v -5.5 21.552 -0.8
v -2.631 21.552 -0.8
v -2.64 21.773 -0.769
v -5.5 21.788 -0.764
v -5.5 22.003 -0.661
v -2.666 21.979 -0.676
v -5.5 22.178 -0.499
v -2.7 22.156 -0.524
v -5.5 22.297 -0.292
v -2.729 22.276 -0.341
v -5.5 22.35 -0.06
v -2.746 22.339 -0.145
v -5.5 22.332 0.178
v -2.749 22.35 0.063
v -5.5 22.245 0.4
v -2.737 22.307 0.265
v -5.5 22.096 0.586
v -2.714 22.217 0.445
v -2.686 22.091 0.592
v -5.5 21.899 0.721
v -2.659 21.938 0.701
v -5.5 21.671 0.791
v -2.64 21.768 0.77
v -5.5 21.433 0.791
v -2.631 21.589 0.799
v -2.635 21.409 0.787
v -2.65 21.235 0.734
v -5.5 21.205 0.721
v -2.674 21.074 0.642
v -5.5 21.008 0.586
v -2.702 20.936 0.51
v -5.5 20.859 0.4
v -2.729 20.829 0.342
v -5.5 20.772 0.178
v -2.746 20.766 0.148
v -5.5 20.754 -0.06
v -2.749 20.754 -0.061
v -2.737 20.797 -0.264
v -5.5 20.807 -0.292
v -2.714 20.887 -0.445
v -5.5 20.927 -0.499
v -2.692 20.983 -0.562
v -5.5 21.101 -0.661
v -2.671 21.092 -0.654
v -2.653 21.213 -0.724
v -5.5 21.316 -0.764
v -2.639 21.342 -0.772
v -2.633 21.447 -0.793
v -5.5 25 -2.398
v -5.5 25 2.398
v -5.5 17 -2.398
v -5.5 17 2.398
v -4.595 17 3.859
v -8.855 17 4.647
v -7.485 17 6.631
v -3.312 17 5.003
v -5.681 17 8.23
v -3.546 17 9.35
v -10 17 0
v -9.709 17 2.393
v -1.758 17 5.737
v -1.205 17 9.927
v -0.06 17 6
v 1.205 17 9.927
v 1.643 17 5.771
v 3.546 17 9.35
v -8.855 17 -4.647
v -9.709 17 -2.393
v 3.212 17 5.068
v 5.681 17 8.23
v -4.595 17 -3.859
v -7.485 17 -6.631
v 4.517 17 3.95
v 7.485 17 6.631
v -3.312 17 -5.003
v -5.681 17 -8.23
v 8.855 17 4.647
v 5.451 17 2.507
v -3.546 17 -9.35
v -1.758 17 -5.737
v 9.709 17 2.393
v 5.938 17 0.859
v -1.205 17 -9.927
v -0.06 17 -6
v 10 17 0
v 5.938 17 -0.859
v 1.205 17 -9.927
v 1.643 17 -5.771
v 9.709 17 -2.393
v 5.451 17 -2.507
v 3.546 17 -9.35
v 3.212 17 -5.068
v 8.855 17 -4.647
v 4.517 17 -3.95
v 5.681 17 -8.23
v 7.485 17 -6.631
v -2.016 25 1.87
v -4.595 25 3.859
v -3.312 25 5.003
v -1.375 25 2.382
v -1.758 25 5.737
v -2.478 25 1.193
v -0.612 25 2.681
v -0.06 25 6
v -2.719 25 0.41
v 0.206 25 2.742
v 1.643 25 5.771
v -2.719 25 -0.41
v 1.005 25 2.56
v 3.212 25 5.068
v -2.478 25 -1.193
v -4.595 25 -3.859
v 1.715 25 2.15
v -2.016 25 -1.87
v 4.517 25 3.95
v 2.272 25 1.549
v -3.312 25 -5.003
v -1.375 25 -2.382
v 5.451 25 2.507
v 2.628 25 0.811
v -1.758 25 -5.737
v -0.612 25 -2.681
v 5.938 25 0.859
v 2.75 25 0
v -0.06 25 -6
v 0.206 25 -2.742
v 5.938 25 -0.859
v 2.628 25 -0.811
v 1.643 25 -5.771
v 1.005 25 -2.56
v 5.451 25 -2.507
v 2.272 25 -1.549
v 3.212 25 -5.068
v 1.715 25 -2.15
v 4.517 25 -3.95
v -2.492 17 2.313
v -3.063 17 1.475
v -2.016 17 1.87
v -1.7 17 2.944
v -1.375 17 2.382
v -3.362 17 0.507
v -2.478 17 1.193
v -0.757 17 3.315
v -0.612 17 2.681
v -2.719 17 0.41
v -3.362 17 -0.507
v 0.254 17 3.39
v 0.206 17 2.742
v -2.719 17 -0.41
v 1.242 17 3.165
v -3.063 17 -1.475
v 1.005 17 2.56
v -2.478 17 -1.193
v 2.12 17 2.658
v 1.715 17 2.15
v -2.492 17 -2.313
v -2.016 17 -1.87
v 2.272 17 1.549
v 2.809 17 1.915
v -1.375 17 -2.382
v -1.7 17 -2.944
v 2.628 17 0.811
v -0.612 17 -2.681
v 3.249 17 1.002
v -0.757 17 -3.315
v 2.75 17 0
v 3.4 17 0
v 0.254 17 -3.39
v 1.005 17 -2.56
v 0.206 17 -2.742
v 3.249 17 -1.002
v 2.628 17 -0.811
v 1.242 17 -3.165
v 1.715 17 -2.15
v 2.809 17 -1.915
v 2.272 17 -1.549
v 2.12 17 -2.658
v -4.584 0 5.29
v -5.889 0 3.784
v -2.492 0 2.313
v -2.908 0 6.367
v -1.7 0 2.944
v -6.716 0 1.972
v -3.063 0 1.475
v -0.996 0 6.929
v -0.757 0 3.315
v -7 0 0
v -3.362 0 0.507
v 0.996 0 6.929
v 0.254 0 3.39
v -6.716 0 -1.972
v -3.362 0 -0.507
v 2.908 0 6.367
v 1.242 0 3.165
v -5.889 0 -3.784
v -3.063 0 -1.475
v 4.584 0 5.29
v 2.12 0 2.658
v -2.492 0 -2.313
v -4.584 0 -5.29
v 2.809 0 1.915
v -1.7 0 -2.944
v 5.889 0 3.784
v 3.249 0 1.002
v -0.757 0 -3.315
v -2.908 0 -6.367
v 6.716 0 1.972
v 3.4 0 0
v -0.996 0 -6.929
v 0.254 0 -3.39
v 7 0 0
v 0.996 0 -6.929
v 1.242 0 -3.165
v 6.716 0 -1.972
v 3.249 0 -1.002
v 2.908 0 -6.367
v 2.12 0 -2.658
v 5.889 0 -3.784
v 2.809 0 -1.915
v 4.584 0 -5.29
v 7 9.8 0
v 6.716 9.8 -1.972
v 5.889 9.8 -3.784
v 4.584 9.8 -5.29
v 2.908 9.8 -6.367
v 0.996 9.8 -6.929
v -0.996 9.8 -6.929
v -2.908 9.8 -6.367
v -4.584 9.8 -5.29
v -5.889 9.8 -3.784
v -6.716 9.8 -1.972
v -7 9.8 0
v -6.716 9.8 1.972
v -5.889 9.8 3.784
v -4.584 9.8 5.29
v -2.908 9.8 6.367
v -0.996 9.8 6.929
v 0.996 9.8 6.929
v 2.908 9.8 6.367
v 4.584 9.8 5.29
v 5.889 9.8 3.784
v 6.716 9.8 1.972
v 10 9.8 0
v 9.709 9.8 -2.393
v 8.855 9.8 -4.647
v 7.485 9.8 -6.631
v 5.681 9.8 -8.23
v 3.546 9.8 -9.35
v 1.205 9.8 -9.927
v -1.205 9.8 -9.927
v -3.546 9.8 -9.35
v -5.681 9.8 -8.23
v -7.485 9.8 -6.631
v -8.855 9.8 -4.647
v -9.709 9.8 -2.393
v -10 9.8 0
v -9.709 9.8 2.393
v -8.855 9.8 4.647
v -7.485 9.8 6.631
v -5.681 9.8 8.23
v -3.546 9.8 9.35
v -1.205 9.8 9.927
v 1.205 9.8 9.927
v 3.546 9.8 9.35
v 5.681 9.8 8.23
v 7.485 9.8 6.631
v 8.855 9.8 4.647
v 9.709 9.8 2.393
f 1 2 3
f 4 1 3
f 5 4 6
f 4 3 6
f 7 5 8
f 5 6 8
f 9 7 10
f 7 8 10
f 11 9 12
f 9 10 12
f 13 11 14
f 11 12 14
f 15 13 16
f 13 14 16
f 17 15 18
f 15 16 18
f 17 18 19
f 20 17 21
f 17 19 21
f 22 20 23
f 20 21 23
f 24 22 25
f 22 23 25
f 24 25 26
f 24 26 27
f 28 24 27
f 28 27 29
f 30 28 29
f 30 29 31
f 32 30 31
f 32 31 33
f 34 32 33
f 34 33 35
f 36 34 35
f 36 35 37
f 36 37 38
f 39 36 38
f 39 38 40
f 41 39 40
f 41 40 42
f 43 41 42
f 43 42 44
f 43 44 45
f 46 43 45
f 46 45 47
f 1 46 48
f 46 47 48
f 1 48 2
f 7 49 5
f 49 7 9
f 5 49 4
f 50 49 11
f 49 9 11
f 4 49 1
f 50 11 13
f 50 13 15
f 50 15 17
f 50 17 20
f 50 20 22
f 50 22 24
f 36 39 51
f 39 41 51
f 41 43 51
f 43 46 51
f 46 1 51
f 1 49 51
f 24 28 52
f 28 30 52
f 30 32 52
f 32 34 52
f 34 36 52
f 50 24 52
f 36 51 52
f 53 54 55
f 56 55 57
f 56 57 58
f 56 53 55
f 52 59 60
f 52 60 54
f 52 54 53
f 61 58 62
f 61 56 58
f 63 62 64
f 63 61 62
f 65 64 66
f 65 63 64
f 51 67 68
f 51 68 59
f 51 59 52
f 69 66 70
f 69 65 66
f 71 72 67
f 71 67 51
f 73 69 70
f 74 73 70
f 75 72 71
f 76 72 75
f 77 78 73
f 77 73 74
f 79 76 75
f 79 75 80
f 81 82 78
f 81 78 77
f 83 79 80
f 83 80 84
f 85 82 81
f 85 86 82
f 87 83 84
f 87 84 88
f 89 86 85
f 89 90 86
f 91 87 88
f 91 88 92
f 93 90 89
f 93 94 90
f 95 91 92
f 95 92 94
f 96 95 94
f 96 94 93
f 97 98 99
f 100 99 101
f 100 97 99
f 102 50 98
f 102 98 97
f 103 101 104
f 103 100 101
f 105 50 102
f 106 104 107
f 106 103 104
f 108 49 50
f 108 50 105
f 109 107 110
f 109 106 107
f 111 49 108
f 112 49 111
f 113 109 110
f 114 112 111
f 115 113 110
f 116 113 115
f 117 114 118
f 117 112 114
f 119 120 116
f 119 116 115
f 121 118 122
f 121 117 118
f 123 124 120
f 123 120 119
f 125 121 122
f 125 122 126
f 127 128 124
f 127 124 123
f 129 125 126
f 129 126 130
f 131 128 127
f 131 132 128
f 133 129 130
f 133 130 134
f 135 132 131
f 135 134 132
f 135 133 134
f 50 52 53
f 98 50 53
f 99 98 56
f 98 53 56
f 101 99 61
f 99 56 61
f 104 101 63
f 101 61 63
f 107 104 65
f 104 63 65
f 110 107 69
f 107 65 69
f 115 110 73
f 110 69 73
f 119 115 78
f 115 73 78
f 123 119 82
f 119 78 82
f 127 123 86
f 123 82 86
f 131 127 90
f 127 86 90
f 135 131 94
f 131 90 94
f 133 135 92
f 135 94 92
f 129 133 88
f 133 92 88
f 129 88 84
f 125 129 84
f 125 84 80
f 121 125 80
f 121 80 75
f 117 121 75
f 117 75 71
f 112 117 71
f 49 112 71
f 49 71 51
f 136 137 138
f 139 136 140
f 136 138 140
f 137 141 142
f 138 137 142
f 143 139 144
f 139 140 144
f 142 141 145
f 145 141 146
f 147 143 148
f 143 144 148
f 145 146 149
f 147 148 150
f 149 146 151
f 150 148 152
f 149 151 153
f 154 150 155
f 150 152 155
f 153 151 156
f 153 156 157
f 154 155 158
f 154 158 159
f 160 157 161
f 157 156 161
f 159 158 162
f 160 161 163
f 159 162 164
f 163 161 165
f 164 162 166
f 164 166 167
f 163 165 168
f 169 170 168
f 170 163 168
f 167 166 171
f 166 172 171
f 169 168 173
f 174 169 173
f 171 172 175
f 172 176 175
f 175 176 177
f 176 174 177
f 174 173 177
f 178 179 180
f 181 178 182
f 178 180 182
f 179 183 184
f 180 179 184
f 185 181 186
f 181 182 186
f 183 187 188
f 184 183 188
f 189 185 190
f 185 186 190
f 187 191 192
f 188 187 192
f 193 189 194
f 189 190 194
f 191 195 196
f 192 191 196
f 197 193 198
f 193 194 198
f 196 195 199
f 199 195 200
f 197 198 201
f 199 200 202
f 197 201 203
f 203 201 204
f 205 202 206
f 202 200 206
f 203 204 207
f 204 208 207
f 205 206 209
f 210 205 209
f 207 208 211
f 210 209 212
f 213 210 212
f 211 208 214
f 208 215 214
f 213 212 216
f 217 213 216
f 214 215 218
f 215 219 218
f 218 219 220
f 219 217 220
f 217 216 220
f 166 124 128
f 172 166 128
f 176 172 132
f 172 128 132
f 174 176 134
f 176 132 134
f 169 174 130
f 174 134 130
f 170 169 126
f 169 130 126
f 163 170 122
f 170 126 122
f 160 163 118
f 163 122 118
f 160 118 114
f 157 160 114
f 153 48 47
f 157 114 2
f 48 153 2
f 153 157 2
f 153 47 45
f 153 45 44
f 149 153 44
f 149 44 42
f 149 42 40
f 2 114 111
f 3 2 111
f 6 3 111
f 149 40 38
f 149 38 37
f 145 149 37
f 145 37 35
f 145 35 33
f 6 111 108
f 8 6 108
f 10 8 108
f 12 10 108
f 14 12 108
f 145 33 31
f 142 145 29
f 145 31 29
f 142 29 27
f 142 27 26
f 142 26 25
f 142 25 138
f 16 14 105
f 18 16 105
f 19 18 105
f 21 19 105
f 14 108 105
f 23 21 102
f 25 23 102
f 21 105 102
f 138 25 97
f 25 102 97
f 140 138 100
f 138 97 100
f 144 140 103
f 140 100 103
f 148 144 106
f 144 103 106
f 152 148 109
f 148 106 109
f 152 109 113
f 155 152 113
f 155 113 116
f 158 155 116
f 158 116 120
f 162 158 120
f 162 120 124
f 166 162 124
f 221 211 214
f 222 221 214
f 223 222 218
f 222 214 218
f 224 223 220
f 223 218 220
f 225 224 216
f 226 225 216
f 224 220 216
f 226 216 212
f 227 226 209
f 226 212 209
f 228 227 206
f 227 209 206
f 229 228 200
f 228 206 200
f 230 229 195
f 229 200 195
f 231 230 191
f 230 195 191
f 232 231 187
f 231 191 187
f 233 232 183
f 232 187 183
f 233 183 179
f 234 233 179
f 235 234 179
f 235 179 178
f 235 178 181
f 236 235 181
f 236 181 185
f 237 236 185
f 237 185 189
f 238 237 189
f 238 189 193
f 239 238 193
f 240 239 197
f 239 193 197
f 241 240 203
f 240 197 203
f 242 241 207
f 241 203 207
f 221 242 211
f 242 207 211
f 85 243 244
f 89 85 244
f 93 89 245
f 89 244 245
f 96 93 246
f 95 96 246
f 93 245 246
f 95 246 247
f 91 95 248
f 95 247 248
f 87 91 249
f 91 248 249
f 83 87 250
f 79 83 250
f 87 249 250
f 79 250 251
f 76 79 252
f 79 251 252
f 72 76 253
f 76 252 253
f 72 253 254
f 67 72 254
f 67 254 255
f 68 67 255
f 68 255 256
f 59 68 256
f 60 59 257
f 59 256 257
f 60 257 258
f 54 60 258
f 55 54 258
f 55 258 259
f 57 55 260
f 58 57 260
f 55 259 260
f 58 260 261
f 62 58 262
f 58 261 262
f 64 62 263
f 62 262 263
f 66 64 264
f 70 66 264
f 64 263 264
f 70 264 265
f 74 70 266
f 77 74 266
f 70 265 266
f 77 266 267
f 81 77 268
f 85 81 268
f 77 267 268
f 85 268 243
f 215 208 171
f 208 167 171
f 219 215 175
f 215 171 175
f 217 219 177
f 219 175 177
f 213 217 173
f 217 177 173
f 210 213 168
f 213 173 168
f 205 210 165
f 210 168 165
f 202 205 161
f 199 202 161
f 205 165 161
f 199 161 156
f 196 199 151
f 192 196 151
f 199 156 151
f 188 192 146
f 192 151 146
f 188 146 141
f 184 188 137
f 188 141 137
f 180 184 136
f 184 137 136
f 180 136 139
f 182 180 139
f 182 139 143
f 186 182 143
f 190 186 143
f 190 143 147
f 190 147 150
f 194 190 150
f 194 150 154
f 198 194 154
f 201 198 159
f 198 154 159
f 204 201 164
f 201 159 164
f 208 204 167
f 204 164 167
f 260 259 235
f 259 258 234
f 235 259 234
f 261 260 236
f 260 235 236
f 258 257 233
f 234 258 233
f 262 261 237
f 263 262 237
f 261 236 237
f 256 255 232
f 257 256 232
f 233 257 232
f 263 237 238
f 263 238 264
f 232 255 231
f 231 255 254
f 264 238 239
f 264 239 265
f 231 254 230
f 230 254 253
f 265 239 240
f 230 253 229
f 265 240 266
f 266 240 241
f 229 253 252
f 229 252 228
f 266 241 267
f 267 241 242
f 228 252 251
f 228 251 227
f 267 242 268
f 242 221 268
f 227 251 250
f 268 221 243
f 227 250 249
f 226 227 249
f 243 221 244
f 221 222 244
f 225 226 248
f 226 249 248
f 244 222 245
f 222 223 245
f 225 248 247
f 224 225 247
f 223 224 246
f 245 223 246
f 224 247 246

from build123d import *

# Parameters (mm, degrees)
SKETCH5_R             = 7
BOSS_EXTRUDE2_DEPTH   = 9.8
SKETCH6_R             = 10
BOSS_EXTRUDE3_DEPTH   = 7.2
M8_TAPPED_HOLE2_D     = 6.8
M8_TAPPED_HOLE2_DEPTH = 17
M8_TAPPED_HOLE2_TIP   = 2.042926105
BOSS_EXTRUDE5_DEPTH   = 8
SKETCH12_R            = 2.75
CUT_EXTRUDE6_DEPTH    = 9
M2_TAPPED_HOLE1_D     = 1.6
M2_TAPPED_HOLE1_DEPTH = 5.2
M2_TAPPED_HOLE1_TIP   = 0.480688495


with BuildPart() as part:
    # Sketch5 → Boss-Extrude2 (new body)
    with BuildSketch(Plane(origin=(0, 0, 0), x_dir=(1, 0, 0), z_dir=(0, 1, 0))):
        Circle(SKETCH5_R)
    extrude(amount=BOSS_EXTRUDE2_DEPTH)

    # Sketch6 → Boss-Extrude3 (add)
    with BuildSketch(Plane(origin=(0, 9.8, 0), x_dir=(1, 0, 0), z_dir=(0, 1, 0))):
        Circle(SKETCH6_R)
    extrude(amount=BOSS_EXTRUDE3_DEPTH)

    # M8 Tapped Hole2
    with Locations(Plane(origin=(0, 0, 0), x_dir=(-1, 0, 0), z_dir=(0, -1, 0))):
        with Locations((0, 0)):
            Hole(M8_TAPPED_HOLE2_D / 2, depth=M8_TAPPED_HOLE2_DEPTH)
            with Locations((0, 0, -(M8_TAPPED_HOLE2_DEPTH + M8_TAPPED_HOLE2_TIP / 2))):  # 118° drill point
                Cone(0, M8_TAPPED_HOLE2_D / 2, M8_TAPPED_HOLE2_TIP, mode=Mode.SUBTRACT)

    # Sketch11 → Boss-Extrude5 (add)
    with BuildSketch(Plane(origin=(0, 17, 0), x_dir=(1, 0, 0), z_dir=(0, 1, 0))):
        with BuildLine():
            Line((-5.5, 2.397915762), (-5.5, -2.397915762))
            ThreePointArc((-5.5, -2.397915762), (6, 0), (-5.5, 2.397915762))
        make_face()
    extrude(amount=BOSS_EXTRUDE5_DEPTH)

    # Sketch12 → Cut-Extrude6 (cut)
    with BuildSketch(Plane(origin=(0, 25, 0), x_dir=(1, 0, 0), z_dir=(0, 1, 0))):
        Circle(SKETCH12_R)
    extrude(amount=-CUT_EXTRUDE6_DEPTH, mode=Mode.SUBTRACT)

    # M2 Tapped Hole1
    with Locations(Plane.ZY.offset(5.5)):
        with Locations((0, 21.552134156)):
            Hole(M2_TAPPED_HOLE1_D / 2, depth=M2_TAPPED_HOLE1_DEPTH)
            with Locations((0, 0, -(M2_TAPPED_HOLE1_DEPTH + M2_TAPPED_HOLE1_TIP / 2))):  # 118° drill point
                Cone(0, M2_TAPPED_HOLE1_D / 2, M2_TAPPED_HOLE1_TIP, mode=Mode.SUBTRACT)


solid = part.part
